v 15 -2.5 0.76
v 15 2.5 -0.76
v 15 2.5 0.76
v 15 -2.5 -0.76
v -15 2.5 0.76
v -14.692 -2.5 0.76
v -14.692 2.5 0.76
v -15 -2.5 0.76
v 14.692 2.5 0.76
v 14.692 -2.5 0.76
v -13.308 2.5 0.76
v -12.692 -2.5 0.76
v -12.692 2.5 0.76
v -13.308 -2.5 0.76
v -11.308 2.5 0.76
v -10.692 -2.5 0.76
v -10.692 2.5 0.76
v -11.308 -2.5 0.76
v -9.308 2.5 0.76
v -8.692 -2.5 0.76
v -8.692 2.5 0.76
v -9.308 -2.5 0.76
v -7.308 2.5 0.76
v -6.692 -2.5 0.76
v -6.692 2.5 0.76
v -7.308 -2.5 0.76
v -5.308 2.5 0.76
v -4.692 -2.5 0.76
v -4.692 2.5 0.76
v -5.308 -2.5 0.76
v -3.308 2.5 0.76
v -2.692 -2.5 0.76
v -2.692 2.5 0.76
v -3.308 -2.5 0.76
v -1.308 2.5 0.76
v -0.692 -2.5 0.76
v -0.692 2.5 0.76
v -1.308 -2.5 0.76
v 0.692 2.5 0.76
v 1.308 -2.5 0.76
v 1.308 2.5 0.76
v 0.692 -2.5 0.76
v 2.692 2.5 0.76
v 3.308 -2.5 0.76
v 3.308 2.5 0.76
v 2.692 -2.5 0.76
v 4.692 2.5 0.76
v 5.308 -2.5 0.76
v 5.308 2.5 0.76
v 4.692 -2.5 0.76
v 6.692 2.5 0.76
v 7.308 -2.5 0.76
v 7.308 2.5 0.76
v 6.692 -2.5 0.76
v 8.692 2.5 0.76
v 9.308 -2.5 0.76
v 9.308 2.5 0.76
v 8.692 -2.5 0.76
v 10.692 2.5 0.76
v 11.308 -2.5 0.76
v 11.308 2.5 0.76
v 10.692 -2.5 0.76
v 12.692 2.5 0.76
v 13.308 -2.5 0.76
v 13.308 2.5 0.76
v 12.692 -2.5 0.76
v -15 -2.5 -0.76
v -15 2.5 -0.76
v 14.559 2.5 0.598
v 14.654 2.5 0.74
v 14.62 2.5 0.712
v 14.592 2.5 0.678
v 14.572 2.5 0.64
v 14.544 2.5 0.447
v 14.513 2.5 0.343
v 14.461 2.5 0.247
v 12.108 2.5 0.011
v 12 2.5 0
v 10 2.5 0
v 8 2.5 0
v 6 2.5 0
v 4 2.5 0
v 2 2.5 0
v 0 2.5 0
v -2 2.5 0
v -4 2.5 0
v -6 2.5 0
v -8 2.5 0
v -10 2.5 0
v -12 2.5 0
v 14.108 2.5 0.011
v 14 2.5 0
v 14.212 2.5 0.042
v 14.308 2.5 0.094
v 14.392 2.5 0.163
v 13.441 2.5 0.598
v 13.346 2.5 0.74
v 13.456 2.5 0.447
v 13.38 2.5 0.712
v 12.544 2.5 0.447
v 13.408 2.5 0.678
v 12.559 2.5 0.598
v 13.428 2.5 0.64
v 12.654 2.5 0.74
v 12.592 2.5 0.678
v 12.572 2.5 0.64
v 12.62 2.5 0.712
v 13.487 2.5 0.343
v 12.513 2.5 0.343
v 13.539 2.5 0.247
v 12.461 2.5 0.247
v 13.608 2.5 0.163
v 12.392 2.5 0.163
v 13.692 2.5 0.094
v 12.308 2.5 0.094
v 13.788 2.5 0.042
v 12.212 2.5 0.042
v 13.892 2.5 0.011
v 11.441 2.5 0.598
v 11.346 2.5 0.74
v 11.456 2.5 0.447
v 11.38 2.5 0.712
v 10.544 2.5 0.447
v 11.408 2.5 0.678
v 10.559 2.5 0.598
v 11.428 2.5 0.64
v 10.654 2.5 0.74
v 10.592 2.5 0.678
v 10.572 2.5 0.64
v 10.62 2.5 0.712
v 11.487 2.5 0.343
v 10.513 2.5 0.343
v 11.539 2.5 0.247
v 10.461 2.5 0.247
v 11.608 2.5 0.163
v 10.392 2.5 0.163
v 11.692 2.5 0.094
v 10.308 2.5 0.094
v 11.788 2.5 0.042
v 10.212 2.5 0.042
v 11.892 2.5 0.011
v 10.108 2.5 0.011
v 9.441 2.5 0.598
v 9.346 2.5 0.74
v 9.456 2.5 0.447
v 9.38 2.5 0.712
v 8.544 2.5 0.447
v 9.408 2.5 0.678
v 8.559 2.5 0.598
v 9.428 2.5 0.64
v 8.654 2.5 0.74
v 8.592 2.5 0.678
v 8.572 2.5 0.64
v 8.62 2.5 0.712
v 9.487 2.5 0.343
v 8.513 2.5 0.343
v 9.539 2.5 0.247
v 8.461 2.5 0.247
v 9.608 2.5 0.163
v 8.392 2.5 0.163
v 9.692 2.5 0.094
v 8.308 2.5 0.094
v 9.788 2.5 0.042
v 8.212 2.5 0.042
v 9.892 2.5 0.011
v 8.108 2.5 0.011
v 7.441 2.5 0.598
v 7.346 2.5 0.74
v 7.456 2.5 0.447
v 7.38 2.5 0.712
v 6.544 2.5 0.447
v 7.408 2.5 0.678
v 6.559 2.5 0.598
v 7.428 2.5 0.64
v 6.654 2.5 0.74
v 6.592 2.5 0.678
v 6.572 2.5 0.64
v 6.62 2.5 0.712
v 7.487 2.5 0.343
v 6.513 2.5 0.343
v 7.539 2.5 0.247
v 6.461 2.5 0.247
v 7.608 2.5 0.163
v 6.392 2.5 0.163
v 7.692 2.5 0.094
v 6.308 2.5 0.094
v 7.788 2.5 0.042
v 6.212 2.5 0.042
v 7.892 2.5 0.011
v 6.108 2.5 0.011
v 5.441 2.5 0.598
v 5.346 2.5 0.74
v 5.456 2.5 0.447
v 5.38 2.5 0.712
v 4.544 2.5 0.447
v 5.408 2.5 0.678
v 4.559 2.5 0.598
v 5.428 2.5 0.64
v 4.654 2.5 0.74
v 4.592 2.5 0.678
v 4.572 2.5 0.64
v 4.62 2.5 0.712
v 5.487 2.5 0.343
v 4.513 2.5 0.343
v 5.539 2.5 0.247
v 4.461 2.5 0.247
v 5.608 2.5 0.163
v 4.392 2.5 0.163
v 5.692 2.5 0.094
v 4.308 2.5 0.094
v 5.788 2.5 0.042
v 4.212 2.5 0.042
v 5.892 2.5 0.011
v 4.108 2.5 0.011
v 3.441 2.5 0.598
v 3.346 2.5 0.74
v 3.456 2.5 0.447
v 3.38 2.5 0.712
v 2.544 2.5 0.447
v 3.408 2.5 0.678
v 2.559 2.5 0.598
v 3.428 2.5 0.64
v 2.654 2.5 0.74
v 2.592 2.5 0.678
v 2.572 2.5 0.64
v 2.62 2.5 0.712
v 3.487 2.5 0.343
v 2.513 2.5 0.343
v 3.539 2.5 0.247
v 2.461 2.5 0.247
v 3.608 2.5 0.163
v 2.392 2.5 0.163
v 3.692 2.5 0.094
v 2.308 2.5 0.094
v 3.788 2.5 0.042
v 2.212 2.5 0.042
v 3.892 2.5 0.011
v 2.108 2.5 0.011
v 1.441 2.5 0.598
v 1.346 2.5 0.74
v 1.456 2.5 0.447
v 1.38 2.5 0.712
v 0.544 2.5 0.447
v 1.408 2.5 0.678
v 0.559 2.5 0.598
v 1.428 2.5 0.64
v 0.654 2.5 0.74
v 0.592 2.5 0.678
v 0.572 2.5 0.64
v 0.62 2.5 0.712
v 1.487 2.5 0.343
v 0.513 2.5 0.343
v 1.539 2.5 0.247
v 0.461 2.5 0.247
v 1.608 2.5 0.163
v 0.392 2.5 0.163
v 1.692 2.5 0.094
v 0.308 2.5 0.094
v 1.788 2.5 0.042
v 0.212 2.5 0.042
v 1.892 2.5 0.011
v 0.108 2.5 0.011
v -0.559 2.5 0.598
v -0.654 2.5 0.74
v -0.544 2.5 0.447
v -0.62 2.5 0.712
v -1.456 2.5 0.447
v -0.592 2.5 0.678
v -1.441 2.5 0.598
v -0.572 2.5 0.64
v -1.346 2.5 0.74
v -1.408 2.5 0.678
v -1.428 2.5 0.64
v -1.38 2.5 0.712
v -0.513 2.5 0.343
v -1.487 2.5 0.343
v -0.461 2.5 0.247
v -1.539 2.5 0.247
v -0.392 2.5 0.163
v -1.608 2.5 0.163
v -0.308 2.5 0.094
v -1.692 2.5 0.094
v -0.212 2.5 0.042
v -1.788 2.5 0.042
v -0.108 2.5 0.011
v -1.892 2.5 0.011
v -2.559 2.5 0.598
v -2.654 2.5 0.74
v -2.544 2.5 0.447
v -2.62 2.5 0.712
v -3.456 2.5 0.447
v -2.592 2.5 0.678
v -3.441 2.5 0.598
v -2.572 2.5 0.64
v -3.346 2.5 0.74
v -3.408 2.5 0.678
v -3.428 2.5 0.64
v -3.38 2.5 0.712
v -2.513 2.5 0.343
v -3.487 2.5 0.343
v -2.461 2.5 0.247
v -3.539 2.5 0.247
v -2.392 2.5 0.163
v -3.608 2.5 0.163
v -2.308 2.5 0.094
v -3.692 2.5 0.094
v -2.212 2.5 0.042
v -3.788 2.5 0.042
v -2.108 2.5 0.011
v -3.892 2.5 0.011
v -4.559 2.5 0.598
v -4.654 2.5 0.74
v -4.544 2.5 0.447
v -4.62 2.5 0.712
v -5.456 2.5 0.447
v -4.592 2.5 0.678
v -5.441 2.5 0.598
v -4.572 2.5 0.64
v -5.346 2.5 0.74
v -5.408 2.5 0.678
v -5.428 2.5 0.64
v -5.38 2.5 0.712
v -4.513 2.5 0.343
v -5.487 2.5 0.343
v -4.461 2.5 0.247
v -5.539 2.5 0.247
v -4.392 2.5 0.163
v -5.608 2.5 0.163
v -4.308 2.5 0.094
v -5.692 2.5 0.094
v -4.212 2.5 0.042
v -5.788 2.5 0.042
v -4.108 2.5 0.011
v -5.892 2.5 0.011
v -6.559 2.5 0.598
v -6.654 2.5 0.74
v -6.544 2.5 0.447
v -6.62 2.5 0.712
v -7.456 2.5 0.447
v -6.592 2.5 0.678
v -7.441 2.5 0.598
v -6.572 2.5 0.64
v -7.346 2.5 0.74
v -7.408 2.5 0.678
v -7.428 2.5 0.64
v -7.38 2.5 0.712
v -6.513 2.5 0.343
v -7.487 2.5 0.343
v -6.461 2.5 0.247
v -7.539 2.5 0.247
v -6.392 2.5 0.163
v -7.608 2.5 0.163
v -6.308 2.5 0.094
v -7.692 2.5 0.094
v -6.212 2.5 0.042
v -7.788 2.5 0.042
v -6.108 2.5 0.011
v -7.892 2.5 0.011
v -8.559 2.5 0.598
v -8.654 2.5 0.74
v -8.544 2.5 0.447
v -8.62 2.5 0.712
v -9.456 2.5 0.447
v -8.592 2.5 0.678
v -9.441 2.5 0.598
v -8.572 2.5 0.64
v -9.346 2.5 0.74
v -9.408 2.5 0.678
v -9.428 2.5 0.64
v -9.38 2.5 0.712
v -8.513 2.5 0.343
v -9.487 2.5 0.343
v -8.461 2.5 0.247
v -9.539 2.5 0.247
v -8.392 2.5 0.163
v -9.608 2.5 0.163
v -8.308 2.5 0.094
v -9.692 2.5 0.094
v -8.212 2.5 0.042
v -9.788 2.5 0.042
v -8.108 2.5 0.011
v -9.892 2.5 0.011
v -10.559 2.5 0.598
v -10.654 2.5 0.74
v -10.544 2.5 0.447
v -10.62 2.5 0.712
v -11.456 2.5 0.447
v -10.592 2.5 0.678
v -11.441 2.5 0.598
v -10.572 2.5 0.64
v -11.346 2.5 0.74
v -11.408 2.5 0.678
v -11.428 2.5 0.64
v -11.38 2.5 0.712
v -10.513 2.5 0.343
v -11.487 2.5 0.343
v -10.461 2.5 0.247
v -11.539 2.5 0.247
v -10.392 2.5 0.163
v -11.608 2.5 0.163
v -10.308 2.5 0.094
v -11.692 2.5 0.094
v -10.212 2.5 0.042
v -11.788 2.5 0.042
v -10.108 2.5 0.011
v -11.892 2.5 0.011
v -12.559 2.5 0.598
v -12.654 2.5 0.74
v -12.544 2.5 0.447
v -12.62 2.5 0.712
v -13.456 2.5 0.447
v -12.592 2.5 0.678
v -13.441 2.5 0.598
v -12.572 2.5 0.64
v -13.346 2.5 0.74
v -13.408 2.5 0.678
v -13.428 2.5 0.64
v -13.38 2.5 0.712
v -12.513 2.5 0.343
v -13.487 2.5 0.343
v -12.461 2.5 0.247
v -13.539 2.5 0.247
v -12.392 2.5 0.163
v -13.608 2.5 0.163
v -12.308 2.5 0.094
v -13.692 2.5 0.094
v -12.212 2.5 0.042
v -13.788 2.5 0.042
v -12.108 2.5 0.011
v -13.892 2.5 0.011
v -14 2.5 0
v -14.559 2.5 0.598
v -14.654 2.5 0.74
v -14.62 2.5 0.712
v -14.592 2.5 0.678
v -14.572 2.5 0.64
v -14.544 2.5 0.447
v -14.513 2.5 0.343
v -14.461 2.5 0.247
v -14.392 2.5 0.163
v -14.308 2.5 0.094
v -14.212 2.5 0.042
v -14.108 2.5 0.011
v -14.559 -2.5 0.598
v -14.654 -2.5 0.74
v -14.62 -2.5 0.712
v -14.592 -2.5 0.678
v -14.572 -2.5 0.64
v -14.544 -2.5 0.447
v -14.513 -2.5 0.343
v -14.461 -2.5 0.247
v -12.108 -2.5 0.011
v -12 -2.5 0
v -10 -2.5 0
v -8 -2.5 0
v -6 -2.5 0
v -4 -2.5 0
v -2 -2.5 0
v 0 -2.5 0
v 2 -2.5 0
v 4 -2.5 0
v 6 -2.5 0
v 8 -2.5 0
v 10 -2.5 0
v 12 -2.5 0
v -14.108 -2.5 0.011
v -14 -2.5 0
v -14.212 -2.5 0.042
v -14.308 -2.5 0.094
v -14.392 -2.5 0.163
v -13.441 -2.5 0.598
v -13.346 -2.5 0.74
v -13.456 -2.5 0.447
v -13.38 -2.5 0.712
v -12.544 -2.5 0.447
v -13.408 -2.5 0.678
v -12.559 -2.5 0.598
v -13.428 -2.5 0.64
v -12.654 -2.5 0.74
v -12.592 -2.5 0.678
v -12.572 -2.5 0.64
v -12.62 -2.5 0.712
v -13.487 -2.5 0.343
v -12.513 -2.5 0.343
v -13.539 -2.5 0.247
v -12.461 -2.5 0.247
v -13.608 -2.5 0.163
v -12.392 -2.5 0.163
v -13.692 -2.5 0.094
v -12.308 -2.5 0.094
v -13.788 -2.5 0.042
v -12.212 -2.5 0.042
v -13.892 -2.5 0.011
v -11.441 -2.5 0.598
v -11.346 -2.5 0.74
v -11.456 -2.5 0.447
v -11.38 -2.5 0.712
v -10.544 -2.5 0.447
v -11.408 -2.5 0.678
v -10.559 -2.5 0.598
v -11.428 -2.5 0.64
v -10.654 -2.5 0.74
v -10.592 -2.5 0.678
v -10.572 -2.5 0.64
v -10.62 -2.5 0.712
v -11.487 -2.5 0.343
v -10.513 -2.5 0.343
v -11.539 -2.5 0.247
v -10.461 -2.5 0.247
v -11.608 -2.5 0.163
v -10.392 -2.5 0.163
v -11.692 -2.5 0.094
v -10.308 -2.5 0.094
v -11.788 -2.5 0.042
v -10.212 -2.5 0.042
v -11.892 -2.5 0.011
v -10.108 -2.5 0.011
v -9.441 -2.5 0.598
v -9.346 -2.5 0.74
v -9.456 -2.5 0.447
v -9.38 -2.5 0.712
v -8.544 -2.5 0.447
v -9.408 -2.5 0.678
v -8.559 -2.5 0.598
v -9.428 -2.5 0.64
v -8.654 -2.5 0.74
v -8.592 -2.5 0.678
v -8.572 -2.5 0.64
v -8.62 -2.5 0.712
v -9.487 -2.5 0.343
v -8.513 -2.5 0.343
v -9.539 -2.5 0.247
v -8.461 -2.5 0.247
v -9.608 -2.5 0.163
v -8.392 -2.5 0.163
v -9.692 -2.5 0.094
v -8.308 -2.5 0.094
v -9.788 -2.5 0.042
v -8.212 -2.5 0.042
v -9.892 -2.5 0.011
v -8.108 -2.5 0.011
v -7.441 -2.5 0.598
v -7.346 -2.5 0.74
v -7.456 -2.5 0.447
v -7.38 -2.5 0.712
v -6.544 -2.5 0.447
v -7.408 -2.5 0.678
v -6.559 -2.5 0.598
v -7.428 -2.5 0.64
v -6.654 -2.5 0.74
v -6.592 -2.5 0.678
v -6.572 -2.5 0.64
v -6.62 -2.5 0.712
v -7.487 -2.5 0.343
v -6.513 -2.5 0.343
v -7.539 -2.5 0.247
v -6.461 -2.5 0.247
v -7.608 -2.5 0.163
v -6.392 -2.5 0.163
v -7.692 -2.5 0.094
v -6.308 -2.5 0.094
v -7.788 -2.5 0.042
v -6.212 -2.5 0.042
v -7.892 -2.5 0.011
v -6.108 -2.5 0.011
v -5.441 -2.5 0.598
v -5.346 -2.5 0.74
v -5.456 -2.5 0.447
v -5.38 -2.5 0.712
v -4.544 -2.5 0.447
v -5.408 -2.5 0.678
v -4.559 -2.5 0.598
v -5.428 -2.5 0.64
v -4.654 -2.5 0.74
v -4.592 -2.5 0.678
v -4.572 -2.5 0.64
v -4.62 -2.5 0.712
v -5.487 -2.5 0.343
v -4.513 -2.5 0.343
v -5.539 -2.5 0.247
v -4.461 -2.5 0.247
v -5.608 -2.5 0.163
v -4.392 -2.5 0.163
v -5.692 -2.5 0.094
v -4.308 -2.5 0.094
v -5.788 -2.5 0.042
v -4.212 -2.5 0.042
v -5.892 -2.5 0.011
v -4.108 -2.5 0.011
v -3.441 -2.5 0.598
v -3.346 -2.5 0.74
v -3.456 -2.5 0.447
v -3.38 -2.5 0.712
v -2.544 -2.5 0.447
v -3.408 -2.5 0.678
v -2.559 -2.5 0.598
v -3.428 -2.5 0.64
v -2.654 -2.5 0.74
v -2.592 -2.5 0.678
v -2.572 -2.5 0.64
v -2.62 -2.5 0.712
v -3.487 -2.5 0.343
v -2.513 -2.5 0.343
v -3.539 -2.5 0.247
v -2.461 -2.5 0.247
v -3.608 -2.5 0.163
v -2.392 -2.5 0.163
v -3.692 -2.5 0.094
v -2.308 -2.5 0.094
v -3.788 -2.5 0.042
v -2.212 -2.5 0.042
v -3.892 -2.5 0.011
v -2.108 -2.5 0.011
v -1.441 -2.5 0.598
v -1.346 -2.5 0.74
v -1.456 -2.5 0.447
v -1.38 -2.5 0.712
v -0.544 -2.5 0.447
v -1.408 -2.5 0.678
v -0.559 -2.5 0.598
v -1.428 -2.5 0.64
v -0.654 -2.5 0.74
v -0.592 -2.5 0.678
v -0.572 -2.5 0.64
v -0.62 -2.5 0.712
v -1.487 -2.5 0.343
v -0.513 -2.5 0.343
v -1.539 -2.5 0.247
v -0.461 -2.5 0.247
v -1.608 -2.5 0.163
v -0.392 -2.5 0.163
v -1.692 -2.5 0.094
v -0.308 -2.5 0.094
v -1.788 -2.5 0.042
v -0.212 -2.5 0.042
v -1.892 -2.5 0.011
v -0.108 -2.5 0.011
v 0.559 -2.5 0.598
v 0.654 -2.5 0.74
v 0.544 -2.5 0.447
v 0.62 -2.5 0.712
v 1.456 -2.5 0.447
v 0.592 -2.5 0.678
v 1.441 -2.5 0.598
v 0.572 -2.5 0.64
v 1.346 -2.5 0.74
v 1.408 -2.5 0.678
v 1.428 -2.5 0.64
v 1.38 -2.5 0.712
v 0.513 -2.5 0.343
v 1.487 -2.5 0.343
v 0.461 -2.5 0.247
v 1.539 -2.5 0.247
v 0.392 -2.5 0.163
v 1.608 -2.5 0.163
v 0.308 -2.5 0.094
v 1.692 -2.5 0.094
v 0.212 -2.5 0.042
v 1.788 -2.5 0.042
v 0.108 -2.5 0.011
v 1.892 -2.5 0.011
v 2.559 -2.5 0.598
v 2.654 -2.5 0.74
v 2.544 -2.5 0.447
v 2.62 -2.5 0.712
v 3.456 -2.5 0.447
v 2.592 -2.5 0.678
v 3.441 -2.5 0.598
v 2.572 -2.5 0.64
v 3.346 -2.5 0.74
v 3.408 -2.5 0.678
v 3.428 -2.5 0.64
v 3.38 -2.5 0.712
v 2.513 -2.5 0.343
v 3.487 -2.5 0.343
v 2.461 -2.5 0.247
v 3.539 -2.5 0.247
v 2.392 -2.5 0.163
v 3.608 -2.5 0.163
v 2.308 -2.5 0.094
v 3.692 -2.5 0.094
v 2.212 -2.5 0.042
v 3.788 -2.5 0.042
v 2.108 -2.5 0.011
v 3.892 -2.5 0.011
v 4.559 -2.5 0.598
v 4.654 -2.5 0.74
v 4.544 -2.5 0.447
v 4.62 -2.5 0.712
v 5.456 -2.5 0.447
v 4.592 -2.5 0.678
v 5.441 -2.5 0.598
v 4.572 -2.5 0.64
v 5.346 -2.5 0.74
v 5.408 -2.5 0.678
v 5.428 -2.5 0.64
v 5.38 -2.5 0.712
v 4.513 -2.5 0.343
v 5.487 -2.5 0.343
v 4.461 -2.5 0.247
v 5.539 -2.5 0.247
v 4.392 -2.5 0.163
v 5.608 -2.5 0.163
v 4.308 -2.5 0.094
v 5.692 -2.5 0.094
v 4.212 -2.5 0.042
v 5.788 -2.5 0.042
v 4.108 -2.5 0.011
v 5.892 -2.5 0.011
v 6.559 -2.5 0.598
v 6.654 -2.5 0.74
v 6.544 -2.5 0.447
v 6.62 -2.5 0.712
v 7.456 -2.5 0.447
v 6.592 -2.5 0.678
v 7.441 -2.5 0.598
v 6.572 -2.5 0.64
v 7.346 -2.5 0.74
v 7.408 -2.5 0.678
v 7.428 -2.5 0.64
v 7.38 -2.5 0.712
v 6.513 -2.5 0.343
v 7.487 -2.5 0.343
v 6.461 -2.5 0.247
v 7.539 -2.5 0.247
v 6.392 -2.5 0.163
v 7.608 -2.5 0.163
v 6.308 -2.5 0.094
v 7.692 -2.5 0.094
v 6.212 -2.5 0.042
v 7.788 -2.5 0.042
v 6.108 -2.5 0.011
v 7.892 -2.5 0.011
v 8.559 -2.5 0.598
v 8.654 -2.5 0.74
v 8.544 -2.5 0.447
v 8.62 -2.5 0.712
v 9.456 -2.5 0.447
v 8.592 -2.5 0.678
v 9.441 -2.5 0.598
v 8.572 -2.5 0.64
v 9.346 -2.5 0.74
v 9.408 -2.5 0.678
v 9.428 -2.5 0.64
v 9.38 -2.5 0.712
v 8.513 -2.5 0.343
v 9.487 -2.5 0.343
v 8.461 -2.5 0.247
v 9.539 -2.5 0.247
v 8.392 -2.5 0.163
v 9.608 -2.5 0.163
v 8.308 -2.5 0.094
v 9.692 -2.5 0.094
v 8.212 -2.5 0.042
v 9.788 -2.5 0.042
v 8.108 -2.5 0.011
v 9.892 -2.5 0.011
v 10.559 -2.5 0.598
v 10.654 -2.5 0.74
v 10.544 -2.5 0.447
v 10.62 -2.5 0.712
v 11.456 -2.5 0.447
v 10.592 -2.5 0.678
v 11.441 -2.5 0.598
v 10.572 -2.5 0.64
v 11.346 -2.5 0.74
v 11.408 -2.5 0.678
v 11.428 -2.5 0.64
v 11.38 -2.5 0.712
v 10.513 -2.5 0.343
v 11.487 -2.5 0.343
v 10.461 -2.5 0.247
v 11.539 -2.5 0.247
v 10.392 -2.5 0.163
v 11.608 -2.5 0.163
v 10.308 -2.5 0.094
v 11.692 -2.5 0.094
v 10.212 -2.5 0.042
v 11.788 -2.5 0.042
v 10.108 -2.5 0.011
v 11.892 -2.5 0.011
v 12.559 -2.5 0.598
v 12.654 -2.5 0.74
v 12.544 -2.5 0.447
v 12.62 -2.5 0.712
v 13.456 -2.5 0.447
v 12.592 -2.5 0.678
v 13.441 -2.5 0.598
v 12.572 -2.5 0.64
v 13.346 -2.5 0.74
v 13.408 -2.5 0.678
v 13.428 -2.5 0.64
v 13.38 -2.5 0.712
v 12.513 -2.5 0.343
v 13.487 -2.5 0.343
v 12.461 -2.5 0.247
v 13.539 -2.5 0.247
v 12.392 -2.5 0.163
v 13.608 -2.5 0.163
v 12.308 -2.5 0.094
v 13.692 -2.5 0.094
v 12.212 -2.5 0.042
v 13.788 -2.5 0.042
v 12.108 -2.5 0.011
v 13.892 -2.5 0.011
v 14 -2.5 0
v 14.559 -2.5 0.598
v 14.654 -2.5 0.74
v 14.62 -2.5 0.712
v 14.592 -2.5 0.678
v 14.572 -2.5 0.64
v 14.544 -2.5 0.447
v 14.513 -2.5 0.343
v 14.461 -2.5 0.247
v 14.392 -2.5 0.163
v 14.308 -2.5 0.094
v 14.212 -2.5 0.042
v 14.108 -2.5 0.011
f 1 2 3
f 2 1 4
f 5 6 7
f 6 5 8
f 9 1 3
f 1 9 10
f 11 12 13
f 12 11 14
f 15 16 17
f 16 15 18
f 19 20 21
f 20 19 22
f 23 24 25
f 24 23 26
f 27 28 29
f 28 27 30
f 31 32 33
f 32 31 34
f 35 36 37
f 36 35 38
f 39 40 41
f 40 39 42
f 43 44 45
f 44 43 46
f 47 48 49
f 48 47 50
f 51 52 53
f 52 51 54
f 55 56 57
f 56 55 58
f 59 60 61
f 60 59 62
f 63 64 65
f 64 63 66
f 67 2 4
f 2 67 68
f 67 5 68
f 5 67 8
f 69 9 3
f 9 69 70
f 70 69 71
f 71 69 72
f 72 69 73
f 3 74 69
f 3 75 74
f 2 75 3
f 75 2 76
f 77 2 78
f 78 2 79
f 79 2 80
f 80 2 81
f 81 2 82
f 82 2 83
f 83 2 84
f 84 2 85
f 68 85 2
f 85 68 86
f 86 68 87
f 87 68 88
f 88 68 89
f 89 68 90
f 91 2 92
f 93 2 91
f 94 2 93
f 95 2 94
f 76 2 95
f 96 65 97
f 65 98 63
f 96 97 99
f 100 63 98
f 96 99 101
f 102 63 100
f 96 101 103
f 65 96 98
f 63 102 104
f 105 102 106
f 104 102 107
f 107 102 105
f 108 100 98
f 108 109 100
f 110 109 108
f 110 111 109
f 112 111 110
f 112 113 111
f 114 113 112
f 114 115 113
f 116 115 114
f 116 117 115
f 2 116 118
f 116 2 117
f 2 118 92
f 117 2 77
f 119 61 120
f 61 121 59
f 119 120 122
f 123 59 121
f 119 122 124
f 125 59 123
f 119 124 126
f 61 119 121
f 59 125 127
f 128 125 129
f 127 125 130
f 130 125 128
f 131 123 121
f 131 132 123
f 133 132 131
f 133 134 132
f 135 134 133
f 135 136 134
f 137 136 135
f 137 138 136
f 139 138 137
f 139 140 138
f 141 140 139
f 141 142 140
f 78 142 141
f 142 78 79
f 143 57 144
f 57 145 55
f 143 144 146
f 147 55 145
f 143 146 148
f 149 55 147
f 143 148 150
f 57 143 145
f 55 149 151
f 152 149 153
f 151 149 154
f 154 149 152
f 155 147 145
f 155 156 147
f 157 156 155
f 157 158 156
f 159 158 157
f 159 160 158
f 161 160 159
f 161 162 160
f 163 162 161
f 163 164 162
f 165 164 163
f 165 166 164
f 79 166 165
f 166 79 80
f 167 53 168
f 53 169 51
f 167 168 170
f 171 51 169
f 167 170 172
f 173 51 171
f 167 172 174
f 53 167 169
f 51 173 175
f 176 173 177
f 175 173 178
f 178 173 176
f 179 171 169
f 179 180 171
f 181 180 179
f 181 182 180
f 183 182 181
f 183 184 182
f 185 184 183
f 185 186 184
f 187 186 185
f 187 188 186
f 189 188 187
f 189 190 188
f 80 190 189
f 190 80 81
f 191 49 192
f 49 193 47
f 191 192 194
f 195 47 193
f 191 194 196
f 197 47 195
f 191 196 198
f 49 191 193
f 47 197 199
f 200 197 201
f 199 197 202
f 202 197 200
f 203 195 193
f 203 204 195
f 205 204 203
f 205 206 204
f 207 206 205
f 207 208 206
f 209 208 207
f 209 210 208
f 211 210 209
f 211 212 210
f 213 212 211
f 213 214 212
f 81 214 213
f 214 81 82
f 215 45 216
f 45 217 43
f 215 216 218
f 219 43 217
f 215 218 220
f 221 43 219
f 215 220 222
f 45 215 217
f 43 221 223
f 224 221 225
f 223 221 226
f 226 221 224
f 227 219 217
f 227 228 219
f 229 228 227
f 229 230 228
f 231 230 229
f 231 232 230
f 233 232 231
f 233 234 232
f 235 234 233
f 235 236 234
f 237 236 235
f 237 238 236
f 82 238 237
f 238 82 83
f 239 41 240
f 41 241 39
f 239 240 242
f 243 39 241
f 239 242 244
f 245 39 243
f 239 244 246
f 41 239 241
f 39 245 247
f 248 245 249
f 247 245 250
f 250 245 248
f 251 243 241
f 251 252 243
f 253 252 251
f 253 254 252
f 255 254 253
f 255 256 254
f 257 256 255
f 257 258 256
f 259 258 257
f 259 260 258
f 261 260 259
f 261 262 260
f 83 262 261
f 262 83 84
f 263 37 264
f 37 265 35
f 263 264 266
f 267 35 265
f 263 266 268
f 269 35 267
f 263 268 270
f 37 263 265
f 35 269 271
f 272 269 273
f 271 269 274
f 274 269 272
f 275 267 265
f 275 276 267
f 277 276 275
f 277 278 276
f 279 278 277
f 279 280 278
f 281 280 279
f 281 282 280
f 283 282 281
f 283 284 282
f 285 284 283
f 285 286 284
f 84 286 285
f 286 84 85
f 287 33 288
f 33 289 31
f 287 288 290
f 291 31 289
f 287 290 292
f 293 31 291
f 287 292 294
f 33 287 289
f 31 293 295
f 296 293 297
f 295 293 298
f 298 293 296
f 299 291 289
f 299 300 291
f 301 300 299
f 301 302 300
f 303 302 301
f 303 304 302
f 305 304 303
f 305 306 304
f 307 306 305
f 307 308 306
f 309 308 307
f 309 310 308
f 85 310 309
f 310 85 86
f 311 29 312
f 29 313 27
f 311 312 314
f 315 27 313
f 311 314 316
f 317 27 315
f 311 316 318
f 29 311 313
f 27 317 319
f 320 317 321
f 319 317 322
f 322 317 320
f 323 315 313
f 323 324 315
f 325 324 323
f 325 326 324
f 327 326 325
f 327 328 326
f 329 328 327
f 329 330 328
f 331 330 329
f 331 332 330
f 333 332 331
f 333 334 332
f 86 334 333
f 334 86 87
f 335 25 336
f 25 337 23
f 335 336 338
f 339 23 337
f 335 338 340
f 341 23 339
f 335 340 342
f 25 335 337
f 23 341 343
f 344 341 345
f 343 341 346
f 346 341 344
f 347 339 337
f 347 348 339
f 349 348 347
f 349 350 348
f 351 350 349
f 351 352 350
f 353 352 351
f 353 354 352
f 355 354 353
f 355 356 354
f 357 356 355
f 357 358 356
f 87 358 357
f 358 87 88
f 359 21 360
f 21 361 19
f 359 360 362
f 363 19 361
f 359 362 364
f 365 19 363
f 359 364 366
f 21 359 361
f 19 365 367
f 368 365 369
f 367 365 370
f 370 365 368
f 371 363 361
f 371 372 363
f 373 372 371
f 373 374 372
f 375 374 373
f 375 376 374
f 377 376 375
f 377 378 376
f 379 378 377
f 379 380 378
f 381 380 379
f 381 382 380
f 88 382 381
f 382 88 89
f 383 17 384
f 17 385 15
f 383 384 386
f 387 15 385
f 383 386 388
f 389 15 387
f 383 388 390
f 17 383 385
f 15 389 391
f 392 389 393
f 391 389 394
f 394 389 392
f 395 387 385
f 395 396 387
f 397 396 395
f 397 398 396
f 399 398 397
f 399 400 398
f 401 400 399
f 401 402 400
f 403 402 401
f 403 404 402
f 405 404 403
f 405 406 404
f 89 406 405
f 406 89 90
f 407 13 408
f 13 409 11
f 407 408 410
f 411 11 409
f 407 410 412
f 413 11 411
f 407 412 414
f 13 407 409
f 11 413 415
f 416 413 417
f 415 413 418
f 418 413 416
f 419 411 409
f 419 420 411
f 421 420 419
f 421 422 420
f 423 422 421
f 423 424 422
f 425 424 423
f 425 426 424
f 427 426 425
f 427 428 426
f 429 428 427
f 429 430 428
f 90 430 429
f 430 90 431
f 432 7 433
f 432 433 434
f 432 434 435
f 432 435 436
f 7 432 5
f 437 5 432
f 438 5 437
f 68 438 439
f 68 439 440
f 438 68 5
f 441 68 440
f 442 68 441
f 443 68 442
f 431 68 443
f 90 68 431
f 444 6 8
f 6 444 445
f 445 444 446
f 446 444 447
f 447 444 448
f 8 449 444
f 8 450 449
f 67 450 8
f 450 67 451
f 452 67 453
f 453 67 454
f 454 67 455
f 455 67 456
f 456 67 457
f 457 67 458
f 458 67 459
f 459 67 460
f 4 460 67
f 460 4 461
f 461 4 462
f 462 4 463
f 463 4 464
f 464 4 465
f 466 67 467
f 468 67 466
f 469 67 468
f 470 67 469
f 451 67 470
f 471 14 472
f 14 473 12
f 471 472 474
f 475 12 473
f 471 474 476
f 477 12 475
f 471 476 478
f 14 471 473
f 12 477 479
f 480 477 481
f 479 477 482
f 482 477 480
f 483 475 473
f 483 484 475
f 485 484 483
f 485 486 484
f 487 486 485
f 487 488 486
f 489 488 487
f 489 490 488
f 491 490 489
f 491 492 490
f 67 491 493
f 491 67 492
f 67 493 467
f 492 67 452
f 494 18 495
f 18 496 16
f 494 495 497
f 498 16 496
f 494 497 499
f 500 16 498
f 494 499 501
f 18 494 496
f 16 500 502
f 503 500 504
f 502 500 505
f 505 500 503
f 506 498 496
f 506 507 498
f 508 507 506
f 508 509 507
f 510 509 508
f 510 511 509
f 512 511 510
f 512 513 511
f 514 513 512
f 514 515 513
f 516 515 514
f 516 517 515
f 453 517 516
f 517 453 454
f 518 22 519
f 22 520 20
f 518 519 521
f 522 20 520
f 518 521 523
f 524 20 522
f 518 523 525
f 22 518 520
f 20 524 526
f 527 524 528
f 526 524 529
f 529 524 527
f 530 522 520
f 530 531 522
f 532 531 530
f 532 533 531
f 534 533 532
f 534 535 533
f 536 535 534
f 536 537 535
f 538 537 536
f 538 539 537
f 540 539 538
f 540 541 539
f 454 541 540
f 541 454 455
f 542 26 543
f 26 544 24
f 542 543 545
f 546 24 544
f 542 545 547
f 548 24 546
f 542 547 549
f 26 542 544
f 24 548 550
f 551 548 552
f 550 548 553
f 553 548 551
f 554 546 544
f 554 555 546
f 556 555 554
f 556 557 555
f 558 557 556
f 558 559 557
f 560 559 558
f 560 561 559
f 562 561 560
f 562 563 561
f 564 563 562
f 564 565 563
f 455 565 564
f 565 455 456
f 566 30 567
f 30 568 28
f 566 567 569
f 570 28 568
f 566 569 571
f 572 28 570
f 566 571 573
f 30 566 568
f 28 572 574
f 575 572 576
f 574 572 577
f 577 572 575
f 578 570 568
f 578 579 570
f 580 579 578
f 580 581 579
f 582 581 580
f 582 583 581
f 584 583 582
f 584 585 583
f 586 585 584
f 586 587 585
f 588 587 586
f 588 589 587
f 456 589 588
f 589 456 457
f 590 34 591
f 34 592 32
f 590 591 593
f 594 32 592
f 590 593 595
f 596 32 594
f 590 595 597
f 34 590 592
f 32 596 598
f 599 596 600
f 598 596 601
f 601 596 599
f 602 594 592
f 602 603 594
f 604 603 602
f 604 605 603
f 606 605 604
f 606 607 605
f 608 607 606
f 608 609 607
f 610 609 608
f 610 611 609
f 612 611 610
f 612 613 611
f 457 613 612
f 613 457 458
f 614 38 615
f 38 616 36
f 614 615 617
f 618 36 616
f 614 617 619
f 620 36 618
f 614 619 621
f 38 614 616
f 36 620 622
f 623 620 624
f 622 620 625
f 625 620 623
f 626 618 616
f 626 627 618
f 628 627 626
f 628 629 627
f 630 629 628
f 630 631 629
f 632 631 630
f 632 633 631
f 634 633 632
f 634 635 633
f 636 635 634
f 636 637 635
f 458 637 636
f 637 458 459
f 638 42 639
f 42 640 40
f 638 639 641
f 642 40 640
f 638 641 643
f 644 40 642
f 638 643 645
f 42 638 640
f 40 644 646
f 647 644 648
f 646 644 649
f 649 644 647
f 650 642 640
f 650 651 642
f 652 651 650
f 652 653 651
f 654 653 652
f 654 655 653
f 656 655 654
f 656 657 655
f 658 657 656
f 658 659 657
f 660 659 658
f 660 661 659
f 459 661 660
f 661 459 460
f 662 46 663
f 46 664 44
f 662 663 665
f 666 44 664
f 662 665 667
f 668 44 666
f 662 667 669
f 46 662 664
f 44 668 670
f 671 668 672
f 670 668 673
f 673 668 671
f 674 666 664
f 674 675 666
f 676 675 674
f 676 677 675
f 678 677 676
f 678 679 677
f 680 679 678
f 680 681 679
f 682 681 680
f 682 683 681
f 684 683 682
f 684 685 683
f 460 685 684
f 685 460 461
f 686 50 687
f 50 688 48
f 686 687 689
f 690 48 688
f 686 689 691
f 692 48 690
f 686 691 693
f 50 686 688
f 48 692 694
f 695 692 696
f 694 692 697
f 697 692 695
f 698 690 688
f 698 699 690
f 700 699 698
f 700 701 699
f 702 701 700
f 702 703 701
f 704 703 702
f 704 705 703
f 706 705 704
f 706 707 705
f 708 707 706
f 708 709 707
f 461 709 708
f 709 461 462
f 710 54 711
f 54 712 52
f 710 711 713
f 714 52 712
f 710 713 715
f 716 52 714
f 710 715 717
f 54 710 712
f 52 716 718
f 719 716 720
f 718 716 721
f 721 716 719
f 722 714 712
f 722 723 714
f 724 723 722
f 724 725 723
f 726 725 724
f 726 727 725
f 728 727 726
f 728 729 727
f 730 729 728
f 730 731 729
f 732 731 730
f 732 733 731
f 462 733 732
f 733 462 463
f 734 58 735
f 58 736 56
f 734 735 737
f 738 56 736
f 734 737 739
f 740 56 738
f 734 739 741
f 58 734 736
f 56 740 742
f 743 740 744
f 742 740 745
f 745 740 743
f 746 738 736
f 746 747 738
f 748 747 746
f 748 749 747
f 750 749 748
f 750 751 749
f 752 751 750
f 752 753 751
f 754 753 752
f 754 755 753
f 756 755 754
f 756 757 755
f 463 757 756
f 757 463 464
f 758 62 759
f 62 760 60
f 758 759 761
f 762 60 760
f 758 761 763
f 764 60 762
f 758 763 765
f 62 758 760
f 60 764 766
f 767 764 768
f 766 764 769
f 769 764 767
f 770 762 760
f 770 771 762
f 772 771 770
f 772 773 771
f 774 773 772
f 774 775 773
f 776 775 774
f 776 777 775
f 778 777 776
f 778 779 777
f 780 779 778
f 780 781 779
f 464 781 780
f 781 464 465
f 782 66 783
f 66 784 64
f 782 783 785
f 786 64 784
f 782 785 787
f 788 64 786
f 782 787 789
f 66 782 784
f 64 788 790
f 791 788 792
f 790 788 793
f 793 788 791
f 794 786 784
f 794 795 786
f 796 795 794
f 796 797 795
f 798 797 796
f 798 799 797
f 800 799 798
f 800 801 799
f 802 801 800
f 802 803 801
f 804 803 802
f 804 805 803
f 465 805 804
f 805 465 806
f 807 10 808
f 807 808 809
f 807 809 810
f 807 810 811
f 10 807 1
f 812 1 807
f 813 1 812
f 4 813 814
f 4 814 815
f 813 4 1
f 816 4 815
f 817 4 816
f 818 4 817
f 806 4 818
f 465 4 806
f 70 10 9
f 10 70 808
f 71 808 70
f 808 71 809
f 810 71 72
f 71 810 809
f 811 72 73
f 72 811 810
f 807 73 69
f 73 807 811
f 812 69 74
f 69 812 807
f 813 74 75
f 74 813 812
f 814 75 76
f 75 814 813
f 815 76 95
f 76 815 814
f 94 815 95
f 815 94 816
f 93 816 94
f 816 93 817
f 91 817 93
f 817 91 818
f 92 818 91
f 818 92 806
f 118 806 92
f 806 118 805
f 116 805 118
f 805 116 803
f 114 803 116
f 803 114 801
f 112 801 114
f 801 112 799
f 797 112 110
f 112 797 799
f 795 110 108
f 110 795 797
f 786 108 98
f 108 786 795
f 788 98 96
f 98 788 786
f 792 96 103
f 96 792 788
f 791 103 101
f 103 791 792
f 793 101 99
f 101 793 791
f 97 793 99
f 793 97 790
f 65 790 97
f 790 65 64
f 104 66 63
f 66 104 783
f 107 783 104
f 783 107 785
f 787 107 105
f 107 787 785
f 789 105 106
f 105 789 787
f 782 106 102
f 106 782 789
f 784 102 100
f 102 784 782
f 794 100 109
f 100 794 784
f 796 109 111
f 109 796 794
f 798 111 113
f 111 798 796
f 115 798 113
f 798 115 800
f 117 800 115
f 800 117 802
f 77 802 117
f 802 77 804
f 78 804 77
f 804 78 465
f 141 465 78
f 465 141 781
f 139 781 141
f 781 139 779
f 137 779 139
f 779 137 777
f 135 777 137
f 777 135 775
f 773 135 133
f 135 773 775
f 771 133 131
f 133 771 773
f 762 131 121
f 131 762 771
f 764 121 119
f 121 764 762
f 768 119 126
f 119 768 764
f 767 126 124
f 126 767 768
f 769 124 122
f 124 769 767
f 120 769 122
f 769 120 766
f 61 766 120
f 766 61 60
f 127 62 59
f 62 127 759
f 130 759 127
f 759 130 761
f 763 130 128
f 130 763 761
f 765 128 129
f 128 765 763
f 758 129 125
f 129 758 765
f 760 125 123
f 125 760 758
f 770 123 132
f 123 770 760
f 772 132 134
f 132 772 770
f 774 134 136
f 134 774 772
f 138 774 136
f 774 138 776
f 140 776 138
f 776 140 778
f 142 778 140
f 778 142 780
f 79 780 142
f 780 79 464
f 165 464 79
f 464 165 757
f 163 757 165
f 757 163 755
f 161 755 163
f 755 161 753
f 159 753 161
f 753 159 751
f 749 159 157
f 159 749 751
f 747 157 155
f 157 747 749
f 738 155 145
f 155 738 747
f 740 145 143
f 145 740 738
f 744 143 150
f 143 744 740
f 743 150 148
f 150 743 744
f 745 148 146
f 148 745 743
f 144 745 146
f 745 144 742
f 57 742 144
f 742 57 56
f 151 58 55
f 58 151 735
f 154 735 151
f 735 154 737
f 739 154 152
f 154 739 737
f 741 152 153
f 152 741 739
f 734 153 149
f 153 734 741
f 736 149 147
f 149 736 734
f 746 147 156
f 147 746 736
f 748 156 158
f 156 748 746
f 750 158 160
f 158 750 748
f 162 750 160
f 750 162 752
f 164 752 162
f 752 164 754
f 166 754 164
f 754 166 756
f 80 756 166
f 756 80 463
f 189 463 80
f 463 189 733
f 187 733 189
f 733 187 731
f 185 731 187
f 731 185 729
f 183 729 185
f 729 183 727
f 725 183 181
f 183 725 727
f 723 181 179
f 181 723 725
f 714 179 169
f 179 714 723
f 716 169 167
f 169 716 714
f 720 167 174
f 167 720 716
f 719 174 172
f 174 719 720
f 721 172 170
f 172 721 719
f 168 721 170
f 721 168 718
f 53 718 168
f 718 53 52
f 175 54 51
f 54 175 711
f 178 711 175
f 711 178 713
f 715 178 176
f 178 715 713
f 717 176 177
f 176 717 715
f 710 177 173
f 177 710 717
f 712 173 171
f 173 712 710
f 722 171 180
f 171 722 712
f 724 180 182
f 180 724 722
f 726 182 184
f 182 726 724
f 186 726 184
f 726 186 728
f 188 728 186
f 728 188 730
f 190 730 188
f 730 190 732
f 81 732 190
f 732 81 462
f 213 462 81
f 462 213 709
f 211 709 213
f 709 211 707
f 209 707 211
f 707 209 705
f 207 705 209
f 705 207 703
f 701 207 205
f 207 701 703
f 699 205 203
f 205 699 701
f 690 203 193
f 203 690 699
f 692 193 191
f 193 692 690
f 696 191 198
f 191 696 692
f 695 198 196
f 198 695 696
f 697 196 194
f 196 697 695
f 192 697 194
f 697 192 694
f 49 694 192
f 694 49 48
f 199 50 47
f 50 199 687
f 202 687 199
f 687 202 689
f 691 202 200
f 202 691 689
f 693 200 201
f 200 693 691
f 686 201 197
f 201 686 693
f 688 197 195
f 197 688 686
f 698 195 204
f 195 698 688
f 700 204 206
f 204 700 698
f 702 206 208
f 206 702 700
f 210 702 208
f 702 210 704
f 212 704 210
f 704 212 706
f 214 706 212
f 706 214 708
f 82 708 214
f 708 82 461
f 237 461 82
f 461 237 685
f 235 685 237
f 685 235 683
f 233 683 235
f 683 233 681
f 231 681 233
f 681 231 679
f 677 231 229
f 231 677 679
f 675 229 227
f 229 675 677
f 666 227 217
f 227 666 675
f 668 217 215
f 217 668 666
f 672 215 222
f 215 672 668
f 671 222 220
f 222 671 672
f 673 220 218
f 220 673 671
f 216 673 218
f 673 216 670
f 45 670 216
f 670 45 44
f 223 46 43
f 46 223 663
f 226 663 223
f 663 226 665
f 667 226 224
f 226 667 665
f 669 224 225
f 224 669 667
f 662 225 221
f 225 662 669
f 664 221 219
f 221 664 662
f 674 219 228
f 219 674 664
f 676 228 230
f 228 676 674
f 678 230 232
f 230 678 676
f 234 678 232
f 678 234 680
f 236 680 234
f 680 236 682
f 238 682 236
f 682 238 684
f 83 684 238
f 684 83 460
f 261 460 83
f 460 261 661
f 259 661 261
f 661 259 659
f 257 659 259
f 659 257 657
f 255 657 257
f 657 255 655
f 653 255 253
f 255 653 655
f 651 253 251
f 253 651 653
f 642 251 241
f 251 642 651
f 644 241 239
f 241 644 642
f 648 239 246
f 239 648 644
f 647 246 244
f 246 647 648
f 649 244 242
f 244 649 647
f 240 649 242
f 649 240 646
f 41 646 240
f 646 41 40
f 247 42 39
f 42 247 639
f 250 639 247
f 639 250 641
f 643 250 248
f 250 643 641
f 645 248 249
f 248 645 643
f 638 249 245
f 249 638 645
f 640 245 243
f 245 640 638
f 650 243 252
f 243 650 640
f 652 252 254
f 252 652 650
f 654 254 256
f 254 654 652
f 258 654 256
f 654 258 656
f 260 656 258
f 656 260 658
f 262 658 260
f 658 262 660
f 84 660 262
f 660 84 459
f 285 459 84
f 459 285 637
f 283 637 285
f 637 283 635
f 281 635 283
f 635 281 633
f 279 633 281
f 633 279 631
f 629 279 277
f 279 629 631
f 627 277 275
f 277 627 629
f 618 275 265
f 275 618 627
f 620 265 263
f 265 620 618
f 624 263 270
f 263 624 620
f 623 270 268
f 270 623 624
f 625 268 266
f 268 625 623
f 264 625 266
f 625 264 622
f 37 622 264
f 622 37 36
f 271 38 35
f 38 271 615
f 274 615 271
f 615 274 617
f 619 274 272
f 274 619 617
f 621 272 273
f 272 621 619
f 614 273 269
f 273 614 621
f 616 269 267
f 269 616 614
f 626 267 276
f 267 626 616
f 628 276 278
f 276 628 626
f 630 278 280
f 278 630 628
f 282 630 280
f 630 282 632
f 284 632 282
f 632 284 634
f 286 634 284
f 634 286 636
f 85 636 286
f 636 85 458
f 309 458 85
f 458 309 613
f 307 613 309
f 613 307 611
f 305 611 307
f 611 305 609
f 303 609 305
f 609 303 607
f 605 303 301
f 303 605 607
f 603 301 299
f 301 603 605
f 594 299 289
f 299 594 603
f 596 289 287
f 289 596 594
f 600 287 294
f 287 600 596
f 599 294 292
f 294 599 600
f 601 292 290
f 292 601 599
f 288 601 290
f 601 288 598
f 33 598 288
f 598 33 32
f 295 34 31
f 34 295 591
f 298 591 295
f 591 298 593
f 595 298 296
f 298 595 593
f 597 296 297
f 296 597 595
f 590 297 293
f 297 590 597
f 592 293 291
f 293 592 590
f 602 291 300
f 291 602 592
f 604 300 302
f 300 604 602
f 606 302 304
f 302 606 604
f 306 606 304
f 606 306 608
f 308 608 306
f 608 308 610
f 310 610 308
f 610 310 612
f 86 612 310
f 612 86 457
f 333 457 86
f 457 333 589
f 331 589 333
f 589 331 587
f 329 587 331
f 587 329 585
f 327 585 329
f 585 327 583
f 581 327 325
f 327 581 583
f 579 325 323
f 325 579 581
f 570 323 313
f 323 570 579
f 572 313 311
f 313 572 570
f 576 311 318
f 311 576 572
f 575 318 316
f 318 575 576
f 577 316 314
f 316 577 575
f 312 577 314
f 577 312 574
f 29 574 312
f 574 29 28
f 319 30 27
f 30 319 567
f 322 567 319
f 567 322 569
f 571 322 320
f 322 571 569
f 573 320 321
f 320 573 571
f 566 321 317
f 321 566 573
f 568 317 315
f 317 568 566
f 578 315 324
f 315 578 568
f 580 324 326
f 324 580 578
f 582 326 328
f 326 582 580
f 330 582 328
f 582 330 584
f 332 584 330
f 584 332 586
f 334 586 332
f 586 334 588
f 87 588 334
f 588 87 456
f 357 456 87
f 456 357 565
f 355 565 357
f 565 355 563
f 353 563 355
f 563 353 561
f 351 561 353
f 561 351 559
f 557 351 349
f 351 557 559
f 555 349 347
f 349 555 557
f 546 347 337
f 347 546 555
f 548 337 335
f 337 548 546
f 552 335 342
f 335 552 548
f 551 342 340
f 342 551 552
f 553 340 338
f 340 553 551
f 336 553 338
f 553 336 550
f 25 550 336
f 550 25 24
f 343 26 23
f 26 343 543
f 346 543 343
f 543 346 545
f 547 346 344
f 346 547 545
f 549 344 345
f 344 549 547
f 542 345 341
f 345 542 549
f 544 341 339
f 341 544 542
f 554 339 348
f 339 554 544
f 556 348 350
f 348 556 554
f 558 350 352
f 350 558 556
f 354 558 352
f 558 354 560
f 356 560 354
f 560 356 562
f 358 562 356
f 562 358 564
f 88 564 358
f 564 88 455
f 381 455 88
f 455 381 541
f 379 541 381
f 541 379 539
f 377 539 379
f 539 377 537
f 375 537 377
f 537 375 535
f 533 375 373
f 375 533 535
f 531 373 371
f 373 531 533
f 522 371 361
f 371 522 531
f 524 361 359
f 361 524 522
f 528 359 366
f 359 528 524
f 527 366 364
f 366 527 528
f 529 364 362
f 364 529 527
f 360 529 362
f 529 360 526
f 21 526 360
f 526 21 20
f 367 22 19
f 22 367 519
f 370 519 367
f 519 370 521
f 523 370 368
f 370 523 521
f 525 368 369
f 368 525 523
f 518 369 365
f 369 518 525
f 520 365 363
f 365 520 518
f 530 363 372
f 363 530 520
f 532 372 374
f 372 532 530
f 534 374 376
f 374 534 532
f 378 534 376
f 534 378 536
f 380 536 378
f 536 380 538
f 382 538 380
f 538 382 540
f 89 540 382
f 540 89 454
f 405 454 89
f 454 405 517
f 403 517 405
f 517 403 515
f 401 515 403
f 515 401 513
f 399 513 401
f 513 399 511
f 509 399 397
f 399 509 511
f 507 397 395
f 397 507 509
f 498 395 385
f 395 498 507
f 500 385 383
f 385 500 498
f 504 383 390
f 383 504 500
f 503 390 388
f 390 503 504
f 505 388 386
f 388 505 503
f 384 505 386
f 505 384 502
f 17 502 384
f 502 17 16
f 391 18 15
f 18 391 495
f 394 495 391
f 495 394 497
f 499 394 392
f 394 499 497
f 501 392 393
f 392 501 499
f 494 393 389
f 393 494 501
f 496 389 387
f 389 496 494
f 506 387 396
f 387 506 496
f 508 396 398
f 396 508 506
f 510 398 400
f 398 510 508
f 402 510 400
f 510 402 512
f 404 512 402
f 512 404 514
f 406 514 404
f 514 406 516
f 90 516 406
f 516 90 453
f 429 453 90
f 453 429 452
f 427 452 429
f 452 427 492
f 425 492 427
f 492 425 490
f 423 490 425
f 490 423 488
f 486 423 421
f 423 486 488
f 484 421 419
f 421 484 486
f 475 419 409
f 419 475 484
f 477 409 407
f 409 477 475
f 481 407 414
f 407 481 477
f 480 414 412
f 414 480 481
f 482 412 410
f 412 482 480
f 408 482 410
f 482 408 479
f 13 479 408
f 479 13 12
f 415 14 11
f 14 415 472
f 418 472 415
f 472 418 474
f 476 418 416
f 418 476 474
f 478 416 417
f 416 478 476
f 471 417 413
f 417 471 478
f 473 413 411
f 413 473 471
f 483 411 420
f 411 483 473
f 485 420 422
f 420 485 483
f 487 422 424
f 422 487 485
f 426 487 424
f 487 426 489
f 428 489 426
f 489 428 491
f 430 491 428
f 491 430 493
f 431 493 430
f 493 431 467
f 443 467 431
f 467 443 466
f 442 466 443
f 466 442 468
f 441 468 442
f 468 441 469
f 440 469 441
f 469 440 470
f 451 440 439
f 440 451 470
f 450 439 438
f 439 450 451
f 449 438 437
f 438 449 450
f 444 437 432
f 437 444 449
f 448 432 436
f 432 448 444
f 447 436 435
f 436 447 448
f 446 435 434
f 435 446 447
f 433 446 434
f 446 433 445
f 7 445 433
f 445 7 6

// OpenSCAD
//
// B E L T
//
// By Sylvain Rochette (sylvain.rochette@gmail.com)
//
// Helper to generate a belt, actually you can generate 
// all types of belt (rounded type) if you know the basic values needed...
//
// Supported Modules:
//
// belt(width, length, pitch, height, teeth_height, radius)
// inverse_belt(width, length, pitch, height, teeth_height, radius)
// gt2_belt(width, length)
// inverse_gt2_belt(width, length)
//

module teeth(width, pitch, radius, inner_radius)
{
    circle(r = radius, $fn = 32);
    
    for (x = [-1, 1])
    {
        translate([x * (radius + inner_radius), 0])
        intersection()
        {
            translate([x * -inner_radius, -inner_radius])
            square([inner_radius * 2, inner_radius * 2], center = true);
            
            difference()
            {
                circle(r = inner_radius + 1, $fn = 32);

                translate([0, 0])
                circle(r = inner_radius, $fn = 32);
            }
        }
    }
}

module belt(width, length, pitch, height, teeth_height, radius)
{
    teeth_count = ceil(length / pitch) - 1;
    
    rotate([90, 0, 0])
    translate([length * -0.5, height * -0.5, 0])
    linear_extrude(height = width, center = true, convexity = 10)
    {
        // Rectangular base
        square([length, height - teeth_height]);
        
        // Teeths
        translate([0, height - radius])
        for (i = [0:teeth_count])
        {
            translate([pitch * 0.5 + i * pitch, 0])
            teeth(
                width = width, 
                pitch = pitch, 
                radius = radius, 
                inner_radius = radius * 0.4,
                teeth_height = teeth_height);
        }
    }
}

module inverse_belt(width, length, pitch, height, teeth_height, radius)
{
    difference()
    {
        translate([length * -0.5, width * -0.5, height * -0.5])
        cube([length, width, height]);
        
        rotate([180, 0, 0])
        translate([0, 0, height * -0.5])
        belt(
            width = width + 1, 
            length = length, 
            pitch = pitch, 
            height = height, 
            teeth_height = teeth_height,
            radius = radius);
    }   
}

module gt2_belt(width, length)
{
    belt(
        width = width, 
        length = length, 
        pitch = 2, 
        height = 1.52, 
        teeth_height = 0.76,
        radius = 0.555);
}

module inverse_gt2_belt(width, length)
{
    inverse_belt(
        width = width, 
        length = length, 
        pitch = 2, 
        height = 1.52, 
        teeth_height = 0.76,
        radius = 0.555);
}

//gt2_belt(5, 30);
inverse_gt2_belt(5, 30);
